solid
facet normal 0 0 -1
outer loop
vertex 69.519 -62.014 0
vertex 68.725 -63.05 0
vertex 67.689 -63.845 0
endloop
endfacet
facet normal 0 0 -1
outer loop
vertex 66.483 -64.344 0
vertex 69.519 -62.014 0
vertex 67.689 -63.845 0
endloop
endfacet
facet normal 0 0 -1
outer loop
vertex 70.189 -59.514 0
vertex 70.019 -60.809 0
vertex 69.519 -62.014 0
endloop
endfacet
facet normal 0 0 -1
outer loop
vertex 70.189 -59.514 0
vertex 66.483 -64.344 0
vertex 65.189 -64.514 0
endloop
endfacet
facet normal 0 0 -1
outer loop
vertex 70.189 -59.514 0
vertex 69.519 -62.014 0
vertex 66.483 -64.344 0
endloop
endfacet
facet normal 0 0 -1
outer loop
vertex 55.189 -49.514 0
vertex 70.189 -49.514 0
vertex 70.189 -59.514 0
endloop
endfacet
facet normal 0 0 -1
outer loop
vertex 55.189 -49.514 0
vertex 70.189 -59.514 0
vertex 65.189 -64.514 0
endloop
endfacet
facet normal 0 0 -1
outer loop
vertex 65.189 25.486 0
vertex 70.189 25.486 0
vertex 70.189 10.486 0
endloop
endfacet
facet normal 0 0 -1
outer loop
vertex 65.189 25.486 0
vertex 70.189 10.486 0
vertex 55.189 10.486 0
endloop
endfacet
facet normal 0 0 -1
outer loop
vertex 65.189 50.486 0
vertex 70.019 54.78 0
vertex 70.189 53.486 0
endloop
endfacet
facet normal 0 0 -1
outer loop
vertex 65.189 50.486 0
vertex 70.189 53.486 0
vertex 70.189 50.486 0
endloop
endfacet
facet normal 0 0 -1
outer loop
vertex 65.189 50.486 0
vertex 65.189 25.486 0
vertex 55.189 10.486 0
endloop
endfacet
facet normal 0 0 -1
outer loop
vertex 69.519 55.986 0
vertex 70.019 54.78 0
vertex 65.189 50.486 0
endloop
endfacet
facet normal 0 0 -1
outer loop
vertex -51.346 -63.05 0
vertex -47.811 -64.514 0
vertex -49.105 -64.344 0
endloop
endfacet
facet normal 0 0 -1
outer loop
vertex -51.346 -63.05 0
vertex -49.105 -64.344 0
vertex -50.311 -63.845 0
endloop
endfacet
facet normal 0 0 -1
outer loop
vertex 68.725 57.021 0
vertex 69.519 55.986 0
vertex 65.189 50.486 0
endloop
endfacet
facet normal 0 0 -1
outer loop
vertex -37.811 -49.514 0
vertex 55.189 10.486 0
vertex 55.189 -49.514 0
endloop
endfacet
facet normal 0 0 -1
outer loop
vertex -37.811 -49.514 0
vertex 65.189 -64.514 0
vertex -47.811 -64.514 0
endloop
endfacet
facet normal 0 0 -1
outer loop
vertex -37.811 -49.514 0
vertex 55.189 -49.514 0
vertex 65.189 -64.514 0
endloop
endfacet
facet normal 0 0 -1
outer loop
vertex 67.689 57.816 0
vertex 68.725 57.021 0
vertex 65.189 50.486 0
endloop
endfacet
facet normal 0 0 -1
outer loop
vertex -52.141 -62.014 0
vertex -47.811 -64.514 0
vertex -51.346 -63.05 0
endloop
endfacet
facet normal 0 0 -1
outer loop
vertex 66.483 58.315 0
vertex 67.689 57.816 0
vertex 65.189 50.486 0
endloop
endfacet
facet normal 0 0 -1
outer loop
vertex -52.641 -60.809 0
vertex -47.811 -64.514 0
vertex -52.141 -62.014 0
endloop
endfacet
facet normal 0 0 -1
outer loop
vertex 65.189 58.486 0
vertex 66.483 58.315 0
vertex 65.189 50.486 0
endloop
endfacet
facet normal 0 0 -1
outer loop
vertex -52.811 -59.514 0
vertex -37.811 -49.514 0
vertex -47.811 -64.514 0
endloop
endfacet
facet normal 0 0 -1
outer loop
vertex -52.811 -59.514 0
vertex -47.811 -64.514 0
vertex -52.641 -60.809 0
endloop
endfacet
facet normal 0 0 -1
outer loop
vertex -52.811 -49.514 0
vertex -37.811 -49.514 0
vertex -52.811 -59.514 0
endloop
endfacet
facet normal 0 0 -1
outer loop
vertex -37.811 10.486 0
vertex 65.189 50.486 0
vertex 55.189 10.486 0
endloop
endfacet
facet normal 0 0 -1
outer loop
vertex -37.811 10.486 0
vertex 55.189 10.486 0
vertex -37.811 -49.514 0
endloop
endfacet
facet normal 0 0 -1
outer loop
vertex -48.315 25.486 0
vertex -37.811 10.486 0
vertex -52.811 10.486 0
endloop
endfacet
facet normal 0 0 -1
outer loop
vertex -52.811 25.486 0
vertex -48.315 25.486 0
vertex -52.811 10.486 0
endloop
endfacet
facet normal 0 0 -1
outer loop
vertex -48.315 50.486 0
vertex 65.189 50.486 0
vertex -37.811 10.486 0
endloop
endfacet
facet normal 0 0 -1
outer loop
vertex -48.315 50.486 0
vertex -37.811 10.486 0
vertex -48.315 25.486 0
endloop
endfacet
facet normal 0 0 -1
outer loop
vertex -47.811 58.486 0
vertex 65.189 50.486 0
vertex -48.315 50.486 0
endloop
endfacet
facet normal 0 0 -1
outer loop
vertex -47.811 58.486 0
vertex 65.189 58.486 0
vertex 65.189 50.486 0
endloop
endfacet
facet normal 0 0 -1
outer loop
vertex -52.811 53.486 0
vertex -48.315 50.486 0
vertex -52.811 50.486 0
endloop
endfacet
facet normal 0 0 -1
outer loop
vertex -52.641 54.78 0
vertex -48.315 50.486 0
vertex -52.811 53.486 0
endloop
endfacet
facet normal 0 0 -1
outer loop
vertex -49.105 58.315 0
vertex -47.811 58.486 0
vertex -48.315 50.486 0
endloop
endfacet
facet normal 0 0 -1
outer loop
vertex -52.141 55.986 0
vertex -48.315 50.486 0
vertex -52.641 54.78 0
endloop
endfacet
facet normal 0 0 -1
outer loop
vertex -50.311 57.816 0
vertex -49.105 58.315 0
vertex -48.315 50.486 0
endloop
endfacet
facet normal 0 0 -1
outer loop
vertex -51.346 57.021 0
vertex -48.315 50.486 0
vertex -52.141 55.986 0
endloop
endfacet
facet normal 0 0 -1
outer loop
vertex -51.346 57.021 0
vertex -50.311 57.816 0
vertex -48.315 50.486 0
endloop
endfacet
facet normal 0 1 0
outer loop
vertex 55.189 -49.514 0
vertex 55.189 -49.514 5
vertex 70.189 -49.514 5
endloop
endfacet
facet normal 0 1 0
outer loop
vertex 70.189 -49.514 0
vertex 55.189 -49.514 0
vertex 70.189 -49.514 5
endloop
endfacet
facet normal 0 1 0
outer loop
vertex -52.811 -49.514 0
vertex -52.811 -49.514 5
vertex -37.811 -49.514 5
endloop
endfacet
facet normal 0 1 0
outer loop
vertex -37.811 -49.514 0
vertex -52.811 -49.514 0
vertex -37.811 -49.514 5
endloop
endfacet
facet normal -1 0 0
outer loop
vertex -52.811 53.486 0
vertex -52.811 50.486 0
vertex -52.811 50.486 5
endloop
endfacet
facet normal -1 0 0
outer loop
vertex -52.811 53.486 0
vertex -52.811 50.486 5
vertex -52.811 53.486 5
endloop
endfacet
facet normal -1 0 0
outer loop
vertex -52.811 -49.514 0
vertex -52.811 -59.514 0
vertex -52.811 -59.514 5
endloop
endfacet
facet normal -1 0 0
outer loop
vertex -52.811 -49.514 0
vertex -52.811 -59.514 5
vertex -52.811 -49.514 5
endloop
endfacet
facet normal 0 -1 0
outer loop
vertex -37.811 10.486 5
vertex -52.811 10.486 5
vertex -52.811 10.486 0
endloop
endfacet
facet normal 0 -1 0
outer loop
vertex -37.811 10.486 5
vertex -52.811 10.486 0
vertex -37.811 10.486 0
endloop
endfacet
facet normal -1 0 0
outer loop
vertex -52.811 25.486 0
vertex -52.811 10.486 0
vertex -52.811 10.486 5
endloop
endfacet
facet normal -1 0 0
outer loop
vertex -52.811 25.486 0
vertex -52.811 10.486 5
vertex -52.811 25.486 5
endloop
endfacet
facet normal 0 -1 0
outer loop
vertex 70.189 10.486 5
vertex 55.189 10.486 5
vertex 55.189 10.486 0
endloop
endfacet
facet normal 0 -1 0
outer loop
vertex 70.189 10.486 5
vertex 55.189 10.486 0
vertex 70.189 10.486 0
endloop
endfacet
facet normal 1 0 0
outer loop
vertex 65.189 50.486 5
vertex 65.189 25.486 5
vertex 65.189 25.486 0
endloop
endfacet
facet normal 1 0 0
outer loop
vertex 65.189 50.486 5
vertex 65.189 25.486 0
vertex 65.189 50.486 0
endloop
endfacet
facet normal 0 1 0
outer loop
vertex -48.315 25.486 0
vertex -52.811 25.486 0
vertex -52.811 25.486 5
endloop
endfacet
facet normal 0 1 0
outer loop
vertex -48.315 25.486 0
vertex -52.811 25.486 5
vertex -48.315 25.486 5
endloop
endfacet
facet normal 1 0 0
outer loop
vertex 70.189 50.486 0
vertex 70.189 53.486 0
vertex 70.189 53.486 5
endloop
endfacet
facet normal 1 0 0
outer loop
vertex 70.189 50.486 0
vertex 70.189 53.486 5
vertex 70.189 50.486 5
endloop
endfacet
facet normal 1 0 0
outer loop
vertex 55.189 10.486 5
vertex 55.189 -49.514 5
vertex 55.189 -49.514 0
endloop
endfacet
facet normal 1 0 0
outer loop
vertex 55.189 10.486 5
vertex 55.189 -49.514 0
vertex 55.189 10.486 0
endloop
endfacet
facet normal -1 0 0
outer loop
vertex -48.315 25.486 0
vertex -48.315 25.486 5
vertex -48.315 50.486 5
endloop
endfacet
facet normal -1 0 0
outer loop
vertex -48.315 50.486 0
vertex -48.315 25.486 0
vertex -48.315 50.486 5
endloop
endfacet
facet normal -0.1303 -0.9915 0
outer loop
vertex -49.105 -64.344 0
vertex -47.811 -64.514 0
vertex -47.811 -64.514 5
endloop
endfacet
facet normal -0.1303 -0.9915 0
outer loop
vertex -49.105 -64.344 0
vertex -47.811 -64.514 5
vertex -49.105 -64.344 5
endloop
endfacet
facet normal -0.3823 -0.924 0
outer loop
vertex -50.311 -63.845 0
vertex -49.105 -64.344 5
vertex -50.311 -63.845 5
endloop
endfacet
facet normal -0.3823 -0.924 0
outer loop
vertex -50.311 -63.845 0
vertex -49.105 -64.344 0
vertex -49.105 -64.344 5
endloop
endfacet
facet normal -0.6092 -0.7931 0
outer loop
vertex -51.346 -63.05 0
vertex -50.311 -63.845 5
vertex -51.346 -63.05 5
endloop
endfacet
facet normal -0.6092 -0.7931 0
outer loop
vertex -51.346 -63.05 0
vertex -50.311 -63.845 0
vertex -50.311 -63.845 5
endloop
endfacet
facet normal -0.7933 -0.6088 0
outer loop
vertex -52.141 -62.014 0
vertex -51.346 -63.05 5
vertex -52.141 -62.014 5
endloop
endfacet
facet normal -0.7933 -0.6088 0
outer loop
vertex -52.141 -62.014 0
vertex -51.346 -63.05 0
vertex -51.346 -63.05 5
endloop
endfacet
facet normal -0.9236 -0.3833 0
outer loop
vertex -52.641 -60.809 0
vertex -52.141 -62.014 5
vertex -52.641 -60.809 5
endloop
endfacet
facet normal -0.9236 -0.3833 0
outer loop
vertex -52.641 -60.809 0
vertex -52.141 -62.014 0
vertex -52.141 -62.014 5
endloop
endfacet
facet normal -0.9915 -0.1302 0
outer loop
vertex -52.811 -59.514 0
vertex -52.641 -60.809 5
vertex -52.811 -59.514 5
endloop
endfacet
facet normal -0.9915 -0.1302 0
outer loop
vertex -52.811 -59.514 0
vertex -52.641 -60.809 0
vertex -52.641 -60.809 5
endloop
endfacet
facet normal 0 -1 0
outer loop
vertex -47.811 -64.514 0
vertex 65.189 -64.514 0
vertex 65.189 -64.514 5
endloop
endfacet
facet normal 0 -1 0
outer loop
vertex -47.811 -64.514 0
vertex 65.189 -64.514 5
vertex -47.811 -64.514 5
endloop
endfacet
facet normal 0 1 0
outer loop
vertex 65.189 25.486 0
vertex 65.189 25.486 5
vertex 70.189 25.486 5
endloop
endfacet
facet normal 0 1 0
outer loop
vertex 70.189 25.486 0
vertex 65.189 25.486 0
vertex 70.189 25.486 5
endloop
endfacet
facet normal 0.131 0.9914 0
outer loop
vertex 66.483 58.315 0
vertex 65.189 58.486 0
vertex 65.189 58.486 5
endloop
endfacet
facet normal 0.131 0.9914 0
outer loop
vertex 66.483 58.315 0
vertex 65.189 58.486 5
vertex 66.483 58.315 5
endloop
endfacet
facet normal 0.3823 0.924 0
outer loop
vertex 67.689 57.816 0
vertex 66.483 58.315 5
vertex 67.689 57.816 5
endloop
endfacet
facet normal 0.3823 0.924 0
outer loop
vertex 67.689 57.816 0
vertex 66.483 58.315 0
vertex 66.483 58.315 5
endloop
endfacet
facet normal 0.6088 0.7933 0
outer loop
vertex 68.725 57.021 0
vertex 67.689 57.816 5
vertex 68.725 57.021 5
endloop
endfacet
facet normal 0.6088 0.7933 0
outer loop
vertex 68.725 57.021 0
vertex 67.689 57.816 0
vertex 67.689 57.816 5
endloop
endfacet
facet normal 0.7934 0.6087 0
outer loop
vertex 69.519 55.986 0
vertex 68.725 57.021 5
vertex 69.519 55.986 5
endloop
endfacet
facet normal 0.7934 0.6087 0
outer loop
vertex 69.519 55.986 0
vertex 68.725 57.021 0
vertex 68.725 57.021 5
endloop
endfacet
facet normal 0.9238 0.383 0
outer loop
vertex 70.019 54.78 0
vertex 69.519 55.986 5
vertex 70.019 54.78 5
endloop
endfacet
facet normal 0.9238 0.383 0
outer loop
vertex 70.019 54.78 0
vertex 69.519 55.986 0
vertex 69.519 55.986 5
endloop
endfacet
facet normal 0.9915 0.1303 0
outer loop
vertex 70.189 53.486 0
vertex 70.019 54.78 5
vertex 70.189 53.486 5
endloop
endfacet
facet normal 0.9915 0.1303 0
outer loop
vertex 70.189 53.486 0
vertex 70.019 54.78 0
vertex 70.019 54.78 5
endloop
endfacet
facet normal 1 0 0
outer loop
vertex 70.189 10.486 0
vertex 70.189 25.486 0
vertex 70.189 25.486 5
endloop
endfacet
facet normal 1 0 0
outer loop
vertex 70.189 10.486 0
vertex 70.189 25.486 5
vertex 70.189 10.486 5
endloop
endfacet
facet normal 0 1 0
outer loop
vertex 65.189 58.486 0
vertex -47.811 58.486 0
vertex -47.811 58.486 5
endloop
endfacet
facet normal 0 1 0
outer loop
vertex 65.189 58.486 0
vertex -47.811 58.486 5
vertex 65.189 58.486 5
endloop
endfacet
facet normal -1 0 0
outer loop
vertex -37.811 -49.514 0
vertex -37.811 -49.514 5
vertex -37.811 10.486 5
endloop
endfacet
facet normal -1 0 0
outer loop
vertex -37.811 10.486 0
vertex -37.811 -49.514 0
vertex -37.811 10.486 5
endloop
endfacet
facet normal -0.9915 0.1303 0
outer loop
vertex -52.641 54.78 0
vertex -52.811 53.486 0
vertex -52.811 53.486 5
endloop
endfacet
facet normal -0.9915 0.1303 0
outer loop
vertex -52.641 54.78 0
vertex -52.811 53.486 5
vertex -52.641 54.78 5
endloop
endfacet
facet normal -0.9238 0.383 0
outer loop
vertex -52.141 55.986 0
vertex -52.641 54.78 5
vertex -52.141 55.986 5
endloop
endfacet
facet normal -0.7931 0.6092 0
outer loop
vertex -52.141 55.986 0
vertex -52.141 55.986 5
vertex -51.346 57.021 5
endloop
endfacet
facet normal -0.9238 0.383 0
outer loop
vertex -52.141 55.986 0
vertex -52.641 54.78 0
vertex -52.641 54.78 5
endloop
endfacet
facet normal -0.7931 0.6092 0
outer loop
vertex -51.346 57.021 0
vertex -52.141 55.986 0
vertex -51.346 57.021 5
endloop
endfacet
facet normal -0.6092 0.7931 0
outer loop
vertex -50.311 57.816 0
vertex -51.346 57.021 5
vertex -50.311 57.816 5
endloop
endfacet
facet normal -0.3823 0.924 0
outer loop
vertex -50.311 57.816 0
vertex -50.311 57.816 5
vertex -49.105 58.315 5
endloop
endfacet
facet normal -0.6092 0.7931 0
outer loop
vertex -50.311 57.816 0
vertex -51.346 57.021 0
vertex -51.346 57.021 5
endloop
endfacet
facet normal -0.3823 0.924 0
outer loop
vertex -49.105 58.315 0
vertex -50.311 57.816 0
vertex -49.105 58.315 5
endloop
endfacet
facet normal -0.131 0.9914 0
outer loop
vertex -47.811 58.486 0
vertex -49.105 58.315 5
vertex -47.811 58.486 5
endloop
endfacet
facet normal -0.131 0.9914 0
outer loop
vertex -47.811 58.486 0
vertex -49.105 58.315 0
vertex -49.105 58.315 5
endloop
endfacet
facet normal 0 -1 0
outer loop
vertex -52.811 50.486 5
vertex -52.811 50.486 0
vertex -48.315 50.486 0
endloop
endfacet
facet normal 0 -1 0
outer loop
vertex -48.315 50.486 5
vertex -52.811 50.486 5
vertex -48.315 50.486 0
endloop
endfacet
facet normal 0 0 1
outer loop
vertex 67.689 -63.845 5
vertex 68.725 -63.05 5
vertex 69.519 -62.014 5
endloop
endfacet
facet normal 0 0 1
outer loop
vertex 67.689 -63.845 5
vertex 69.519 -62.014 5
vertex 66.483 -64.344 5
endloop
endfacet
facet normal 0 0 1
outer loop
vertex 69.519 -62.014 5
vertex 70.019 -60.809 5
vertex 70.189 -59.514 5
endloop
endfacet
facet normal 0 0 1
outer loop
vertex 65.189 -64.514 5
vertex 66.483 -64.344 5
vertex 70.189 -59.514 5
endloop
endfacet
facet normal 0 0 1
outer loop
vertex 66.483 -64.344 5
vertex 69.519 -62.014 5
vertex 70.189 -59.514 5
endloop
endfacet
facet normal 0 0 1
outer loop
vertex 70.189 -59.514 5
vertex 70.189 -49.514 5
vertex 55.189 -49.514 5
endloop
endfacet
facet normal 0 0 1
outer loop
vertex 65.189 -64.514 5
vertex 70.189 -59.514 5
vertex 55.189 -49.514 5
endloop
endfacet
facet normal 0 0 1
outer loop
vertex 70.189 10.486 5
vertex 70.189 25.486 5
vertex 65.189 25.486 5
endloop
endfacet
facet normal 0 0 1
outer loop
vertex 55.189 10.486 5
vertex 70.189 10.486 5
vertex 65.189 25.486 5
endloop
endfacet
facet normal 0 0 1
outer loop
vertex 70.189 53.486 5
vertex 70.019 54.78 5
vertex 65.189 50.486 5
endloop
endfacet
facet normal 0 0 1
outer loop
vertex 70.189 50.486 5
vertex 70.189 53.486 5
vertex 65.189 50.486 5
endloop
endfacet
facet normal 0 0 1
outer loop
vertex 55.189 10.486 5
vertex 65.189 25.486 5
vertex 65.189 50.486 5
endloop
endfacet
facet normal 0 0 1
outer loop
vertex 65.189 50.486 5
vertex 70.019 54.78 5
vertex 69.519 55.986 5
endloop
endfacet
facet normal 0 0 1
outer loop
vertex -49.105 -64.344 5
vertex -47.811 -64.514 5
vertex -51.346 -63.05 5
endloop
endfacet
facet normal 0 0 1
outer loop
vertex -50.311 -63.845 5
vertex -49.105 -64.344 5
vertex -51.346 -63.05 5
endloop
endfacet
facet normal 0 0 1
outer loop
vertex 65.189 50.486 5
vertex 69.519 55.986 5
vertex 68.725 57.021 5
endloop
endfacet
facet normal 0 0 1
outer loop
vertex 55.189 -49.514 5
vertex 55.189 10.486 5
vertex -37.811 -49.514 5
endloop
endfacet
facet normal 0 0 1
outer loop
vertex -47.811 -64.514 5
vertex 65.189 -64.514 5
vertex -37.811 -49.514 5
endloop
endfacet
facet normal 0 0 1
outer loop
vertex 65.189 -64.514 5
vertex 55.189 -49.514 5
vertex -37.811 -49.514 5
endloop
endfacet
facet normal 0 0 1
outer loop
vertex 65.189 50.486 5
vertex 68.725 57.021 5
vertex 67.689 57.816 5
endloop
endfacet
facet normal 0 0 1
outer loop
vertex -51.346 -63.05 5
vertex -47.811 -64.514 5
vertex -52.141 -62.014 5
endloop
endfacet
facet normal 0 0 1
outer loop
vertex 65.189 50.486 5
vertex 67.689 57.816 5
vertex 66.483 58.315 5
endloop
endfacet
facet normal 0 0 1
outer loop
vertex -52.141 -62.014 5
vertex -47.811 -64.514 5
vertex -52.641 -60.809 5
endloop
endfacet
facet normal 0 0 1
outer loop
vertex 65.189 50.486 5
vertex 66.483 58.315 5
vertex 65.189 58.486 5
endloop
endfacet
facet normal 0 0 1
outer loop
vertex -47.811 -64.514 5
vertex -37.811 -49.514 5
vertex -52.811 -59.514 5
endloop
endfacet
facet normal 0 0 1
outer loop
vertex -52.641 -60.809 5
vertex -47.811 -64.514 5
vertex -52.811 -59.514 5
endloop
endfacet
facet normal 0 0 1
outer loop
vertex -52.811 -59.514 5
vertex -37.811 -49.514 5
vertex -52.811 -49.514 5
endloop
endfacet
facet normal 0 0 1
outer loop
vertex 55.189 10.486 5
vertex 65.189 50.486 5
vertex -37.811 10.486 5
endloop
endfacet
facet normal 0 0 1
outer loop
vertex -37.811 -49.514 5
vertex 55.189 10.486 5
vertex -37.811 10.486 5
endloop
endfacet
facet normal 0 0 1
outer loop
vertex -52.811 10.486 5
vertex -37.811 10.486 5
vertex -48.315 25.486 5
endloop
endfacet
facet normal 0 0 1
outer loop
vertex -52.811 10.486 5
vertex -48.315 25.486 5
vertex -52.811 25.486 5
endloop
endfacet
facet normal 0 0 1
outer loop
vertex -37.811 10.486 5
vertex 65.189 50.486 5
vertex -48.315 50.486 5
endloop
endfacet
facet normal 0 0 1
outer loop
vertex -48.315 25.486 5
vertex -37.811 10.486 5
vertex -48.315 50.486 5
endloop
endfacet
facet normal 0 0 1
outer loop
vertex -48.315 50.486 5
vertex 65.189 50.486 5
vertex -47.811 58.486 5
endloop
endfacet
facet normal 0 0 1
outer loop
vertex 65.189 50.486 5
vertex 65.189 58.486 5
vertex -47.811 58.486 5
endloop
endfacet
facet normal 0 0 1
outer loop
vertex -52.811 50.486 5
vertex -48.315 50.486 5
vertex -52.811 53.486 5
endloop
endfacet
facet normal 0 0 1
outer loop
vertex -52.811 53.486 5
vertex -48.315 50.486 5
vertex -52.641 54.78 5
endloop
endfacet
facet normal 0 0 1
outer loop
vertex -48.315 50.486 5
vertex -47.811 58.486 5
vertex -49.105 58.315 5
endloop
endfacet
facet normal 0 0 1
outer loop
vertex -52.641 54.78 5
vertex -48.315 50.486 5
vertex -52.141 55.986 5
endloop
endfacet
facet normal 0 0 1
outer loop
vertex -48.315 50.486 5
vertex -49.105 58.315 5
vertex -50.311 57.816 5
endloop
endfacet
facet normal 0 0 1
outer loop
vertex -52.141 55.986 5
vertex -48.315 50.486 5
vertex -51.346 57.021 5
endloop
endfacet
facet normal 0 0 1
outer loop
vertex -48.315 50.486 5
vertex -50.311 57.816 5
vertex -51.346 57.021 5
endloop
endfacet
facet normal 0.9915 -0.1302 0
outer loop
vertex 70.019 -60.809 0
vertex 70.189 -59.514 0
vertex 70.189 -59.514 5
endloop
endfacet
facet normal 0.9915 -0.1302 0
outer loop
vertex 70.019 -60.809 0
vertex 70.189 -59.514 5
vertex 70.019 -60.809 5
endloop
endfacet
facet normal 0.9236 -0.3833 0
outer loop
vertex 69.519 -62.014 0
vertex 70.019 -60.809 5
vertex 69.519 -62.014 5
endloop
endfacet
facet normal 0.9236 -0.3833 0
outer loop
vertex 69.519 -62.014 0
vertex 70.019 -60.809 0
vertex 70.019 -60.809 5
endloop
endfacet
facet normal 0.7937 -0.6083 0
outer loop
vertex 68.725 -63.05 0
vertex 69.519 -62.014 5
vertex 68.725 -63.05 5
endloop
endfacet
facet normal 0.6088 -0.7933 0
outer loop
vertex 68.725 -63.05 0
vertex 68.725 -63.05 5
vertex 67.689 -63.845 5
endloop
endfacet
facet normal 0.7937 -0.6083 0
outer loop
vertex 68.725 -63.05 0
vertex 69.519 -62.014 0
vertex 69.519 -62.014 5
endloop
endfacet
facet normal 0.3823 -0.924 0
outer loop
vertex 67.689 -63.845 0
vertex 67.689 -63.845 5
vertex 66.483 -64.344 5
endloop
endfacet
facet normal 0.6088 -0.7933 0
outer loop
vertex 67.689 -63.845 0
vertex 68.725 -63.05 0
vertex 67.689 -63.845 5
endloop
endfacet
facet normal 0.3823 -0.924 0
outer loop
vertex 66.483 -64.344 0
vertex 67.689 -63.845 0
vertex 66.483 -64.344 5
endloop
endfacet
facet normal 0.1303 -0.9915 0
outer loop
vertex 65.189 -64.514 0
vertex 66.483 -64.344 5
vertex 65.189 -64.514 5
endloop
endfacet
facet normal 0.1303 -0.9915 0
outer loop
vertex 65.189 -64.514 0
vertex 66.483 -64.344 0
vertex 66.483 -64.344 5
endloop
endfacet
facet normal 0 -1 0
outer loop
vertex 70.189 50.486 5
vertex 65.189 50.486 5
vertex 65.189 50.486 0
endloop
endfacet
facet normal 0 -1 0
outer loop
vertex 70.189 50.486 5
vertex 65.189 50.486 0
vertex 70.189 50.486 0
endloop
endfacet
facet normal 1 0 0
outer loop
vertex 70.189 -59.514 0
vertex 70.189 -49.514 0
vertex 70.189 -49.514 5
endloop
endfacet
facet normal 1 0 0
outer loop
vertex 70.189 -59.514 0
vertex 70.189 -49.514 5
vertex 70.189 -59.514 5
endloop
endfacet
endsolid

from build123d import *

# Parameters (mm, degrees)
RESSALTO_EXTRUS_O1_DEPTH = 5
ESBO_O4_W                = 4.495494134
ESBO_O4_H                = 25
CORTE_EXTRUS_O2_DEPTH    = 5
ESBO_O11_W               = 5
ESBO_O11_H               = 25
CORTE_EXTRUS_O8_DEPTH    = 10
ESBO_O24_W               = 15
ESBO_O24_H               = 60
CORTE_EXTRUS_O14_DEPTH   = 10
ESBO_O27_W               = 15
ESBO_O27_H               = 60
CORTE_EXTRUS_O16_DEPTH   = 25


with BuildPart() as part:
    # Esboço1 → Ressalto-extrusão1 (new body)
    with BuildSketch(Plane.XY):
        with BuildLine():
            Line((-47.810925728, 58.485502959), (65.189074272, 58.485502959))
            ThreePointArc((65.189074272, 58.485502959), (68.724608178, 57.021036865), (70.189074272, 53.485502959))
            Line((70.189074272, 53.485502959), (70.189074272, -59.514497041))
            ThreePointArc((70.189074272, -59.514497041), (68.724608178, -63.050030947), (65.189074272, -64.514497041))
            Line((65.189074272, -64.514497041), (-47.810925728, -64.514497041))
            ThreePointArc((-47.810925728, -64.514497041), (-51.346459634, -63.050030947), (-52.810925728, -59.514497041))
            Line((-52.810925728, -59.514497041), (-52.810925728, 53.485502959))
            ThreePointArc((-52.810925728, 53.485502959), (-51.346459634, 57.021036865), (-47.810925728, 58.485502959))
        make_face()
    extrude(amount=RESSALTO_EXTRUS_O1_DEPTH)

    # Esboço4 → Corte-extrusão2 (cut)
    with BuildSketch(Plane.XY.offset(5)):
        with Locations((-50.563178661, 37.985502959)):
            Rectangle(ESBO_O4_W, ESBO_O4_H)
    extrude(amount=-CORTE_EXTRUS_O2_DEPTH, mode=Mode.SUBTRACT)

    # Esboço11 → Corte-extrusão8 (cut)
    with BuildSketch(Plane.XY.offset(5)):
        with Locations((67.689074272, 37.985502959)):
            Rectangle(ESBO_O11_W, ESBO_O11_H)
    extrude(amount=-CORTE_EXTRUS_O8_DEPTH, mode=Mode.SUBTRACT)

    # Esboço24 → Corte-extrusão14 (cut)
    with BuildSketch(Plane.XY.offset(5)):
        with Locations((-45.310925728, -19.514497041)):
            Rectangle(ESBO_O24_W, ESBO_O24_H)
    extrude(amount=-CORTE_EXTRUS_O14_DEPTH, mode=Mode.SUBTRACT)

    # Esboço27 → Corte-extrusão16 (cut)
    with BuildSketch(Plane.XY.offset(5)):
        with Locations((62.689074272, -19.514497041)):
            Rectangle(ESBO_O27_W, ESBO_O27_H)
    extrude(amount=-CORTE_EXTRUS_O16_DEPTH, mode=Mode.SUBTRACT)


solid = part.part
